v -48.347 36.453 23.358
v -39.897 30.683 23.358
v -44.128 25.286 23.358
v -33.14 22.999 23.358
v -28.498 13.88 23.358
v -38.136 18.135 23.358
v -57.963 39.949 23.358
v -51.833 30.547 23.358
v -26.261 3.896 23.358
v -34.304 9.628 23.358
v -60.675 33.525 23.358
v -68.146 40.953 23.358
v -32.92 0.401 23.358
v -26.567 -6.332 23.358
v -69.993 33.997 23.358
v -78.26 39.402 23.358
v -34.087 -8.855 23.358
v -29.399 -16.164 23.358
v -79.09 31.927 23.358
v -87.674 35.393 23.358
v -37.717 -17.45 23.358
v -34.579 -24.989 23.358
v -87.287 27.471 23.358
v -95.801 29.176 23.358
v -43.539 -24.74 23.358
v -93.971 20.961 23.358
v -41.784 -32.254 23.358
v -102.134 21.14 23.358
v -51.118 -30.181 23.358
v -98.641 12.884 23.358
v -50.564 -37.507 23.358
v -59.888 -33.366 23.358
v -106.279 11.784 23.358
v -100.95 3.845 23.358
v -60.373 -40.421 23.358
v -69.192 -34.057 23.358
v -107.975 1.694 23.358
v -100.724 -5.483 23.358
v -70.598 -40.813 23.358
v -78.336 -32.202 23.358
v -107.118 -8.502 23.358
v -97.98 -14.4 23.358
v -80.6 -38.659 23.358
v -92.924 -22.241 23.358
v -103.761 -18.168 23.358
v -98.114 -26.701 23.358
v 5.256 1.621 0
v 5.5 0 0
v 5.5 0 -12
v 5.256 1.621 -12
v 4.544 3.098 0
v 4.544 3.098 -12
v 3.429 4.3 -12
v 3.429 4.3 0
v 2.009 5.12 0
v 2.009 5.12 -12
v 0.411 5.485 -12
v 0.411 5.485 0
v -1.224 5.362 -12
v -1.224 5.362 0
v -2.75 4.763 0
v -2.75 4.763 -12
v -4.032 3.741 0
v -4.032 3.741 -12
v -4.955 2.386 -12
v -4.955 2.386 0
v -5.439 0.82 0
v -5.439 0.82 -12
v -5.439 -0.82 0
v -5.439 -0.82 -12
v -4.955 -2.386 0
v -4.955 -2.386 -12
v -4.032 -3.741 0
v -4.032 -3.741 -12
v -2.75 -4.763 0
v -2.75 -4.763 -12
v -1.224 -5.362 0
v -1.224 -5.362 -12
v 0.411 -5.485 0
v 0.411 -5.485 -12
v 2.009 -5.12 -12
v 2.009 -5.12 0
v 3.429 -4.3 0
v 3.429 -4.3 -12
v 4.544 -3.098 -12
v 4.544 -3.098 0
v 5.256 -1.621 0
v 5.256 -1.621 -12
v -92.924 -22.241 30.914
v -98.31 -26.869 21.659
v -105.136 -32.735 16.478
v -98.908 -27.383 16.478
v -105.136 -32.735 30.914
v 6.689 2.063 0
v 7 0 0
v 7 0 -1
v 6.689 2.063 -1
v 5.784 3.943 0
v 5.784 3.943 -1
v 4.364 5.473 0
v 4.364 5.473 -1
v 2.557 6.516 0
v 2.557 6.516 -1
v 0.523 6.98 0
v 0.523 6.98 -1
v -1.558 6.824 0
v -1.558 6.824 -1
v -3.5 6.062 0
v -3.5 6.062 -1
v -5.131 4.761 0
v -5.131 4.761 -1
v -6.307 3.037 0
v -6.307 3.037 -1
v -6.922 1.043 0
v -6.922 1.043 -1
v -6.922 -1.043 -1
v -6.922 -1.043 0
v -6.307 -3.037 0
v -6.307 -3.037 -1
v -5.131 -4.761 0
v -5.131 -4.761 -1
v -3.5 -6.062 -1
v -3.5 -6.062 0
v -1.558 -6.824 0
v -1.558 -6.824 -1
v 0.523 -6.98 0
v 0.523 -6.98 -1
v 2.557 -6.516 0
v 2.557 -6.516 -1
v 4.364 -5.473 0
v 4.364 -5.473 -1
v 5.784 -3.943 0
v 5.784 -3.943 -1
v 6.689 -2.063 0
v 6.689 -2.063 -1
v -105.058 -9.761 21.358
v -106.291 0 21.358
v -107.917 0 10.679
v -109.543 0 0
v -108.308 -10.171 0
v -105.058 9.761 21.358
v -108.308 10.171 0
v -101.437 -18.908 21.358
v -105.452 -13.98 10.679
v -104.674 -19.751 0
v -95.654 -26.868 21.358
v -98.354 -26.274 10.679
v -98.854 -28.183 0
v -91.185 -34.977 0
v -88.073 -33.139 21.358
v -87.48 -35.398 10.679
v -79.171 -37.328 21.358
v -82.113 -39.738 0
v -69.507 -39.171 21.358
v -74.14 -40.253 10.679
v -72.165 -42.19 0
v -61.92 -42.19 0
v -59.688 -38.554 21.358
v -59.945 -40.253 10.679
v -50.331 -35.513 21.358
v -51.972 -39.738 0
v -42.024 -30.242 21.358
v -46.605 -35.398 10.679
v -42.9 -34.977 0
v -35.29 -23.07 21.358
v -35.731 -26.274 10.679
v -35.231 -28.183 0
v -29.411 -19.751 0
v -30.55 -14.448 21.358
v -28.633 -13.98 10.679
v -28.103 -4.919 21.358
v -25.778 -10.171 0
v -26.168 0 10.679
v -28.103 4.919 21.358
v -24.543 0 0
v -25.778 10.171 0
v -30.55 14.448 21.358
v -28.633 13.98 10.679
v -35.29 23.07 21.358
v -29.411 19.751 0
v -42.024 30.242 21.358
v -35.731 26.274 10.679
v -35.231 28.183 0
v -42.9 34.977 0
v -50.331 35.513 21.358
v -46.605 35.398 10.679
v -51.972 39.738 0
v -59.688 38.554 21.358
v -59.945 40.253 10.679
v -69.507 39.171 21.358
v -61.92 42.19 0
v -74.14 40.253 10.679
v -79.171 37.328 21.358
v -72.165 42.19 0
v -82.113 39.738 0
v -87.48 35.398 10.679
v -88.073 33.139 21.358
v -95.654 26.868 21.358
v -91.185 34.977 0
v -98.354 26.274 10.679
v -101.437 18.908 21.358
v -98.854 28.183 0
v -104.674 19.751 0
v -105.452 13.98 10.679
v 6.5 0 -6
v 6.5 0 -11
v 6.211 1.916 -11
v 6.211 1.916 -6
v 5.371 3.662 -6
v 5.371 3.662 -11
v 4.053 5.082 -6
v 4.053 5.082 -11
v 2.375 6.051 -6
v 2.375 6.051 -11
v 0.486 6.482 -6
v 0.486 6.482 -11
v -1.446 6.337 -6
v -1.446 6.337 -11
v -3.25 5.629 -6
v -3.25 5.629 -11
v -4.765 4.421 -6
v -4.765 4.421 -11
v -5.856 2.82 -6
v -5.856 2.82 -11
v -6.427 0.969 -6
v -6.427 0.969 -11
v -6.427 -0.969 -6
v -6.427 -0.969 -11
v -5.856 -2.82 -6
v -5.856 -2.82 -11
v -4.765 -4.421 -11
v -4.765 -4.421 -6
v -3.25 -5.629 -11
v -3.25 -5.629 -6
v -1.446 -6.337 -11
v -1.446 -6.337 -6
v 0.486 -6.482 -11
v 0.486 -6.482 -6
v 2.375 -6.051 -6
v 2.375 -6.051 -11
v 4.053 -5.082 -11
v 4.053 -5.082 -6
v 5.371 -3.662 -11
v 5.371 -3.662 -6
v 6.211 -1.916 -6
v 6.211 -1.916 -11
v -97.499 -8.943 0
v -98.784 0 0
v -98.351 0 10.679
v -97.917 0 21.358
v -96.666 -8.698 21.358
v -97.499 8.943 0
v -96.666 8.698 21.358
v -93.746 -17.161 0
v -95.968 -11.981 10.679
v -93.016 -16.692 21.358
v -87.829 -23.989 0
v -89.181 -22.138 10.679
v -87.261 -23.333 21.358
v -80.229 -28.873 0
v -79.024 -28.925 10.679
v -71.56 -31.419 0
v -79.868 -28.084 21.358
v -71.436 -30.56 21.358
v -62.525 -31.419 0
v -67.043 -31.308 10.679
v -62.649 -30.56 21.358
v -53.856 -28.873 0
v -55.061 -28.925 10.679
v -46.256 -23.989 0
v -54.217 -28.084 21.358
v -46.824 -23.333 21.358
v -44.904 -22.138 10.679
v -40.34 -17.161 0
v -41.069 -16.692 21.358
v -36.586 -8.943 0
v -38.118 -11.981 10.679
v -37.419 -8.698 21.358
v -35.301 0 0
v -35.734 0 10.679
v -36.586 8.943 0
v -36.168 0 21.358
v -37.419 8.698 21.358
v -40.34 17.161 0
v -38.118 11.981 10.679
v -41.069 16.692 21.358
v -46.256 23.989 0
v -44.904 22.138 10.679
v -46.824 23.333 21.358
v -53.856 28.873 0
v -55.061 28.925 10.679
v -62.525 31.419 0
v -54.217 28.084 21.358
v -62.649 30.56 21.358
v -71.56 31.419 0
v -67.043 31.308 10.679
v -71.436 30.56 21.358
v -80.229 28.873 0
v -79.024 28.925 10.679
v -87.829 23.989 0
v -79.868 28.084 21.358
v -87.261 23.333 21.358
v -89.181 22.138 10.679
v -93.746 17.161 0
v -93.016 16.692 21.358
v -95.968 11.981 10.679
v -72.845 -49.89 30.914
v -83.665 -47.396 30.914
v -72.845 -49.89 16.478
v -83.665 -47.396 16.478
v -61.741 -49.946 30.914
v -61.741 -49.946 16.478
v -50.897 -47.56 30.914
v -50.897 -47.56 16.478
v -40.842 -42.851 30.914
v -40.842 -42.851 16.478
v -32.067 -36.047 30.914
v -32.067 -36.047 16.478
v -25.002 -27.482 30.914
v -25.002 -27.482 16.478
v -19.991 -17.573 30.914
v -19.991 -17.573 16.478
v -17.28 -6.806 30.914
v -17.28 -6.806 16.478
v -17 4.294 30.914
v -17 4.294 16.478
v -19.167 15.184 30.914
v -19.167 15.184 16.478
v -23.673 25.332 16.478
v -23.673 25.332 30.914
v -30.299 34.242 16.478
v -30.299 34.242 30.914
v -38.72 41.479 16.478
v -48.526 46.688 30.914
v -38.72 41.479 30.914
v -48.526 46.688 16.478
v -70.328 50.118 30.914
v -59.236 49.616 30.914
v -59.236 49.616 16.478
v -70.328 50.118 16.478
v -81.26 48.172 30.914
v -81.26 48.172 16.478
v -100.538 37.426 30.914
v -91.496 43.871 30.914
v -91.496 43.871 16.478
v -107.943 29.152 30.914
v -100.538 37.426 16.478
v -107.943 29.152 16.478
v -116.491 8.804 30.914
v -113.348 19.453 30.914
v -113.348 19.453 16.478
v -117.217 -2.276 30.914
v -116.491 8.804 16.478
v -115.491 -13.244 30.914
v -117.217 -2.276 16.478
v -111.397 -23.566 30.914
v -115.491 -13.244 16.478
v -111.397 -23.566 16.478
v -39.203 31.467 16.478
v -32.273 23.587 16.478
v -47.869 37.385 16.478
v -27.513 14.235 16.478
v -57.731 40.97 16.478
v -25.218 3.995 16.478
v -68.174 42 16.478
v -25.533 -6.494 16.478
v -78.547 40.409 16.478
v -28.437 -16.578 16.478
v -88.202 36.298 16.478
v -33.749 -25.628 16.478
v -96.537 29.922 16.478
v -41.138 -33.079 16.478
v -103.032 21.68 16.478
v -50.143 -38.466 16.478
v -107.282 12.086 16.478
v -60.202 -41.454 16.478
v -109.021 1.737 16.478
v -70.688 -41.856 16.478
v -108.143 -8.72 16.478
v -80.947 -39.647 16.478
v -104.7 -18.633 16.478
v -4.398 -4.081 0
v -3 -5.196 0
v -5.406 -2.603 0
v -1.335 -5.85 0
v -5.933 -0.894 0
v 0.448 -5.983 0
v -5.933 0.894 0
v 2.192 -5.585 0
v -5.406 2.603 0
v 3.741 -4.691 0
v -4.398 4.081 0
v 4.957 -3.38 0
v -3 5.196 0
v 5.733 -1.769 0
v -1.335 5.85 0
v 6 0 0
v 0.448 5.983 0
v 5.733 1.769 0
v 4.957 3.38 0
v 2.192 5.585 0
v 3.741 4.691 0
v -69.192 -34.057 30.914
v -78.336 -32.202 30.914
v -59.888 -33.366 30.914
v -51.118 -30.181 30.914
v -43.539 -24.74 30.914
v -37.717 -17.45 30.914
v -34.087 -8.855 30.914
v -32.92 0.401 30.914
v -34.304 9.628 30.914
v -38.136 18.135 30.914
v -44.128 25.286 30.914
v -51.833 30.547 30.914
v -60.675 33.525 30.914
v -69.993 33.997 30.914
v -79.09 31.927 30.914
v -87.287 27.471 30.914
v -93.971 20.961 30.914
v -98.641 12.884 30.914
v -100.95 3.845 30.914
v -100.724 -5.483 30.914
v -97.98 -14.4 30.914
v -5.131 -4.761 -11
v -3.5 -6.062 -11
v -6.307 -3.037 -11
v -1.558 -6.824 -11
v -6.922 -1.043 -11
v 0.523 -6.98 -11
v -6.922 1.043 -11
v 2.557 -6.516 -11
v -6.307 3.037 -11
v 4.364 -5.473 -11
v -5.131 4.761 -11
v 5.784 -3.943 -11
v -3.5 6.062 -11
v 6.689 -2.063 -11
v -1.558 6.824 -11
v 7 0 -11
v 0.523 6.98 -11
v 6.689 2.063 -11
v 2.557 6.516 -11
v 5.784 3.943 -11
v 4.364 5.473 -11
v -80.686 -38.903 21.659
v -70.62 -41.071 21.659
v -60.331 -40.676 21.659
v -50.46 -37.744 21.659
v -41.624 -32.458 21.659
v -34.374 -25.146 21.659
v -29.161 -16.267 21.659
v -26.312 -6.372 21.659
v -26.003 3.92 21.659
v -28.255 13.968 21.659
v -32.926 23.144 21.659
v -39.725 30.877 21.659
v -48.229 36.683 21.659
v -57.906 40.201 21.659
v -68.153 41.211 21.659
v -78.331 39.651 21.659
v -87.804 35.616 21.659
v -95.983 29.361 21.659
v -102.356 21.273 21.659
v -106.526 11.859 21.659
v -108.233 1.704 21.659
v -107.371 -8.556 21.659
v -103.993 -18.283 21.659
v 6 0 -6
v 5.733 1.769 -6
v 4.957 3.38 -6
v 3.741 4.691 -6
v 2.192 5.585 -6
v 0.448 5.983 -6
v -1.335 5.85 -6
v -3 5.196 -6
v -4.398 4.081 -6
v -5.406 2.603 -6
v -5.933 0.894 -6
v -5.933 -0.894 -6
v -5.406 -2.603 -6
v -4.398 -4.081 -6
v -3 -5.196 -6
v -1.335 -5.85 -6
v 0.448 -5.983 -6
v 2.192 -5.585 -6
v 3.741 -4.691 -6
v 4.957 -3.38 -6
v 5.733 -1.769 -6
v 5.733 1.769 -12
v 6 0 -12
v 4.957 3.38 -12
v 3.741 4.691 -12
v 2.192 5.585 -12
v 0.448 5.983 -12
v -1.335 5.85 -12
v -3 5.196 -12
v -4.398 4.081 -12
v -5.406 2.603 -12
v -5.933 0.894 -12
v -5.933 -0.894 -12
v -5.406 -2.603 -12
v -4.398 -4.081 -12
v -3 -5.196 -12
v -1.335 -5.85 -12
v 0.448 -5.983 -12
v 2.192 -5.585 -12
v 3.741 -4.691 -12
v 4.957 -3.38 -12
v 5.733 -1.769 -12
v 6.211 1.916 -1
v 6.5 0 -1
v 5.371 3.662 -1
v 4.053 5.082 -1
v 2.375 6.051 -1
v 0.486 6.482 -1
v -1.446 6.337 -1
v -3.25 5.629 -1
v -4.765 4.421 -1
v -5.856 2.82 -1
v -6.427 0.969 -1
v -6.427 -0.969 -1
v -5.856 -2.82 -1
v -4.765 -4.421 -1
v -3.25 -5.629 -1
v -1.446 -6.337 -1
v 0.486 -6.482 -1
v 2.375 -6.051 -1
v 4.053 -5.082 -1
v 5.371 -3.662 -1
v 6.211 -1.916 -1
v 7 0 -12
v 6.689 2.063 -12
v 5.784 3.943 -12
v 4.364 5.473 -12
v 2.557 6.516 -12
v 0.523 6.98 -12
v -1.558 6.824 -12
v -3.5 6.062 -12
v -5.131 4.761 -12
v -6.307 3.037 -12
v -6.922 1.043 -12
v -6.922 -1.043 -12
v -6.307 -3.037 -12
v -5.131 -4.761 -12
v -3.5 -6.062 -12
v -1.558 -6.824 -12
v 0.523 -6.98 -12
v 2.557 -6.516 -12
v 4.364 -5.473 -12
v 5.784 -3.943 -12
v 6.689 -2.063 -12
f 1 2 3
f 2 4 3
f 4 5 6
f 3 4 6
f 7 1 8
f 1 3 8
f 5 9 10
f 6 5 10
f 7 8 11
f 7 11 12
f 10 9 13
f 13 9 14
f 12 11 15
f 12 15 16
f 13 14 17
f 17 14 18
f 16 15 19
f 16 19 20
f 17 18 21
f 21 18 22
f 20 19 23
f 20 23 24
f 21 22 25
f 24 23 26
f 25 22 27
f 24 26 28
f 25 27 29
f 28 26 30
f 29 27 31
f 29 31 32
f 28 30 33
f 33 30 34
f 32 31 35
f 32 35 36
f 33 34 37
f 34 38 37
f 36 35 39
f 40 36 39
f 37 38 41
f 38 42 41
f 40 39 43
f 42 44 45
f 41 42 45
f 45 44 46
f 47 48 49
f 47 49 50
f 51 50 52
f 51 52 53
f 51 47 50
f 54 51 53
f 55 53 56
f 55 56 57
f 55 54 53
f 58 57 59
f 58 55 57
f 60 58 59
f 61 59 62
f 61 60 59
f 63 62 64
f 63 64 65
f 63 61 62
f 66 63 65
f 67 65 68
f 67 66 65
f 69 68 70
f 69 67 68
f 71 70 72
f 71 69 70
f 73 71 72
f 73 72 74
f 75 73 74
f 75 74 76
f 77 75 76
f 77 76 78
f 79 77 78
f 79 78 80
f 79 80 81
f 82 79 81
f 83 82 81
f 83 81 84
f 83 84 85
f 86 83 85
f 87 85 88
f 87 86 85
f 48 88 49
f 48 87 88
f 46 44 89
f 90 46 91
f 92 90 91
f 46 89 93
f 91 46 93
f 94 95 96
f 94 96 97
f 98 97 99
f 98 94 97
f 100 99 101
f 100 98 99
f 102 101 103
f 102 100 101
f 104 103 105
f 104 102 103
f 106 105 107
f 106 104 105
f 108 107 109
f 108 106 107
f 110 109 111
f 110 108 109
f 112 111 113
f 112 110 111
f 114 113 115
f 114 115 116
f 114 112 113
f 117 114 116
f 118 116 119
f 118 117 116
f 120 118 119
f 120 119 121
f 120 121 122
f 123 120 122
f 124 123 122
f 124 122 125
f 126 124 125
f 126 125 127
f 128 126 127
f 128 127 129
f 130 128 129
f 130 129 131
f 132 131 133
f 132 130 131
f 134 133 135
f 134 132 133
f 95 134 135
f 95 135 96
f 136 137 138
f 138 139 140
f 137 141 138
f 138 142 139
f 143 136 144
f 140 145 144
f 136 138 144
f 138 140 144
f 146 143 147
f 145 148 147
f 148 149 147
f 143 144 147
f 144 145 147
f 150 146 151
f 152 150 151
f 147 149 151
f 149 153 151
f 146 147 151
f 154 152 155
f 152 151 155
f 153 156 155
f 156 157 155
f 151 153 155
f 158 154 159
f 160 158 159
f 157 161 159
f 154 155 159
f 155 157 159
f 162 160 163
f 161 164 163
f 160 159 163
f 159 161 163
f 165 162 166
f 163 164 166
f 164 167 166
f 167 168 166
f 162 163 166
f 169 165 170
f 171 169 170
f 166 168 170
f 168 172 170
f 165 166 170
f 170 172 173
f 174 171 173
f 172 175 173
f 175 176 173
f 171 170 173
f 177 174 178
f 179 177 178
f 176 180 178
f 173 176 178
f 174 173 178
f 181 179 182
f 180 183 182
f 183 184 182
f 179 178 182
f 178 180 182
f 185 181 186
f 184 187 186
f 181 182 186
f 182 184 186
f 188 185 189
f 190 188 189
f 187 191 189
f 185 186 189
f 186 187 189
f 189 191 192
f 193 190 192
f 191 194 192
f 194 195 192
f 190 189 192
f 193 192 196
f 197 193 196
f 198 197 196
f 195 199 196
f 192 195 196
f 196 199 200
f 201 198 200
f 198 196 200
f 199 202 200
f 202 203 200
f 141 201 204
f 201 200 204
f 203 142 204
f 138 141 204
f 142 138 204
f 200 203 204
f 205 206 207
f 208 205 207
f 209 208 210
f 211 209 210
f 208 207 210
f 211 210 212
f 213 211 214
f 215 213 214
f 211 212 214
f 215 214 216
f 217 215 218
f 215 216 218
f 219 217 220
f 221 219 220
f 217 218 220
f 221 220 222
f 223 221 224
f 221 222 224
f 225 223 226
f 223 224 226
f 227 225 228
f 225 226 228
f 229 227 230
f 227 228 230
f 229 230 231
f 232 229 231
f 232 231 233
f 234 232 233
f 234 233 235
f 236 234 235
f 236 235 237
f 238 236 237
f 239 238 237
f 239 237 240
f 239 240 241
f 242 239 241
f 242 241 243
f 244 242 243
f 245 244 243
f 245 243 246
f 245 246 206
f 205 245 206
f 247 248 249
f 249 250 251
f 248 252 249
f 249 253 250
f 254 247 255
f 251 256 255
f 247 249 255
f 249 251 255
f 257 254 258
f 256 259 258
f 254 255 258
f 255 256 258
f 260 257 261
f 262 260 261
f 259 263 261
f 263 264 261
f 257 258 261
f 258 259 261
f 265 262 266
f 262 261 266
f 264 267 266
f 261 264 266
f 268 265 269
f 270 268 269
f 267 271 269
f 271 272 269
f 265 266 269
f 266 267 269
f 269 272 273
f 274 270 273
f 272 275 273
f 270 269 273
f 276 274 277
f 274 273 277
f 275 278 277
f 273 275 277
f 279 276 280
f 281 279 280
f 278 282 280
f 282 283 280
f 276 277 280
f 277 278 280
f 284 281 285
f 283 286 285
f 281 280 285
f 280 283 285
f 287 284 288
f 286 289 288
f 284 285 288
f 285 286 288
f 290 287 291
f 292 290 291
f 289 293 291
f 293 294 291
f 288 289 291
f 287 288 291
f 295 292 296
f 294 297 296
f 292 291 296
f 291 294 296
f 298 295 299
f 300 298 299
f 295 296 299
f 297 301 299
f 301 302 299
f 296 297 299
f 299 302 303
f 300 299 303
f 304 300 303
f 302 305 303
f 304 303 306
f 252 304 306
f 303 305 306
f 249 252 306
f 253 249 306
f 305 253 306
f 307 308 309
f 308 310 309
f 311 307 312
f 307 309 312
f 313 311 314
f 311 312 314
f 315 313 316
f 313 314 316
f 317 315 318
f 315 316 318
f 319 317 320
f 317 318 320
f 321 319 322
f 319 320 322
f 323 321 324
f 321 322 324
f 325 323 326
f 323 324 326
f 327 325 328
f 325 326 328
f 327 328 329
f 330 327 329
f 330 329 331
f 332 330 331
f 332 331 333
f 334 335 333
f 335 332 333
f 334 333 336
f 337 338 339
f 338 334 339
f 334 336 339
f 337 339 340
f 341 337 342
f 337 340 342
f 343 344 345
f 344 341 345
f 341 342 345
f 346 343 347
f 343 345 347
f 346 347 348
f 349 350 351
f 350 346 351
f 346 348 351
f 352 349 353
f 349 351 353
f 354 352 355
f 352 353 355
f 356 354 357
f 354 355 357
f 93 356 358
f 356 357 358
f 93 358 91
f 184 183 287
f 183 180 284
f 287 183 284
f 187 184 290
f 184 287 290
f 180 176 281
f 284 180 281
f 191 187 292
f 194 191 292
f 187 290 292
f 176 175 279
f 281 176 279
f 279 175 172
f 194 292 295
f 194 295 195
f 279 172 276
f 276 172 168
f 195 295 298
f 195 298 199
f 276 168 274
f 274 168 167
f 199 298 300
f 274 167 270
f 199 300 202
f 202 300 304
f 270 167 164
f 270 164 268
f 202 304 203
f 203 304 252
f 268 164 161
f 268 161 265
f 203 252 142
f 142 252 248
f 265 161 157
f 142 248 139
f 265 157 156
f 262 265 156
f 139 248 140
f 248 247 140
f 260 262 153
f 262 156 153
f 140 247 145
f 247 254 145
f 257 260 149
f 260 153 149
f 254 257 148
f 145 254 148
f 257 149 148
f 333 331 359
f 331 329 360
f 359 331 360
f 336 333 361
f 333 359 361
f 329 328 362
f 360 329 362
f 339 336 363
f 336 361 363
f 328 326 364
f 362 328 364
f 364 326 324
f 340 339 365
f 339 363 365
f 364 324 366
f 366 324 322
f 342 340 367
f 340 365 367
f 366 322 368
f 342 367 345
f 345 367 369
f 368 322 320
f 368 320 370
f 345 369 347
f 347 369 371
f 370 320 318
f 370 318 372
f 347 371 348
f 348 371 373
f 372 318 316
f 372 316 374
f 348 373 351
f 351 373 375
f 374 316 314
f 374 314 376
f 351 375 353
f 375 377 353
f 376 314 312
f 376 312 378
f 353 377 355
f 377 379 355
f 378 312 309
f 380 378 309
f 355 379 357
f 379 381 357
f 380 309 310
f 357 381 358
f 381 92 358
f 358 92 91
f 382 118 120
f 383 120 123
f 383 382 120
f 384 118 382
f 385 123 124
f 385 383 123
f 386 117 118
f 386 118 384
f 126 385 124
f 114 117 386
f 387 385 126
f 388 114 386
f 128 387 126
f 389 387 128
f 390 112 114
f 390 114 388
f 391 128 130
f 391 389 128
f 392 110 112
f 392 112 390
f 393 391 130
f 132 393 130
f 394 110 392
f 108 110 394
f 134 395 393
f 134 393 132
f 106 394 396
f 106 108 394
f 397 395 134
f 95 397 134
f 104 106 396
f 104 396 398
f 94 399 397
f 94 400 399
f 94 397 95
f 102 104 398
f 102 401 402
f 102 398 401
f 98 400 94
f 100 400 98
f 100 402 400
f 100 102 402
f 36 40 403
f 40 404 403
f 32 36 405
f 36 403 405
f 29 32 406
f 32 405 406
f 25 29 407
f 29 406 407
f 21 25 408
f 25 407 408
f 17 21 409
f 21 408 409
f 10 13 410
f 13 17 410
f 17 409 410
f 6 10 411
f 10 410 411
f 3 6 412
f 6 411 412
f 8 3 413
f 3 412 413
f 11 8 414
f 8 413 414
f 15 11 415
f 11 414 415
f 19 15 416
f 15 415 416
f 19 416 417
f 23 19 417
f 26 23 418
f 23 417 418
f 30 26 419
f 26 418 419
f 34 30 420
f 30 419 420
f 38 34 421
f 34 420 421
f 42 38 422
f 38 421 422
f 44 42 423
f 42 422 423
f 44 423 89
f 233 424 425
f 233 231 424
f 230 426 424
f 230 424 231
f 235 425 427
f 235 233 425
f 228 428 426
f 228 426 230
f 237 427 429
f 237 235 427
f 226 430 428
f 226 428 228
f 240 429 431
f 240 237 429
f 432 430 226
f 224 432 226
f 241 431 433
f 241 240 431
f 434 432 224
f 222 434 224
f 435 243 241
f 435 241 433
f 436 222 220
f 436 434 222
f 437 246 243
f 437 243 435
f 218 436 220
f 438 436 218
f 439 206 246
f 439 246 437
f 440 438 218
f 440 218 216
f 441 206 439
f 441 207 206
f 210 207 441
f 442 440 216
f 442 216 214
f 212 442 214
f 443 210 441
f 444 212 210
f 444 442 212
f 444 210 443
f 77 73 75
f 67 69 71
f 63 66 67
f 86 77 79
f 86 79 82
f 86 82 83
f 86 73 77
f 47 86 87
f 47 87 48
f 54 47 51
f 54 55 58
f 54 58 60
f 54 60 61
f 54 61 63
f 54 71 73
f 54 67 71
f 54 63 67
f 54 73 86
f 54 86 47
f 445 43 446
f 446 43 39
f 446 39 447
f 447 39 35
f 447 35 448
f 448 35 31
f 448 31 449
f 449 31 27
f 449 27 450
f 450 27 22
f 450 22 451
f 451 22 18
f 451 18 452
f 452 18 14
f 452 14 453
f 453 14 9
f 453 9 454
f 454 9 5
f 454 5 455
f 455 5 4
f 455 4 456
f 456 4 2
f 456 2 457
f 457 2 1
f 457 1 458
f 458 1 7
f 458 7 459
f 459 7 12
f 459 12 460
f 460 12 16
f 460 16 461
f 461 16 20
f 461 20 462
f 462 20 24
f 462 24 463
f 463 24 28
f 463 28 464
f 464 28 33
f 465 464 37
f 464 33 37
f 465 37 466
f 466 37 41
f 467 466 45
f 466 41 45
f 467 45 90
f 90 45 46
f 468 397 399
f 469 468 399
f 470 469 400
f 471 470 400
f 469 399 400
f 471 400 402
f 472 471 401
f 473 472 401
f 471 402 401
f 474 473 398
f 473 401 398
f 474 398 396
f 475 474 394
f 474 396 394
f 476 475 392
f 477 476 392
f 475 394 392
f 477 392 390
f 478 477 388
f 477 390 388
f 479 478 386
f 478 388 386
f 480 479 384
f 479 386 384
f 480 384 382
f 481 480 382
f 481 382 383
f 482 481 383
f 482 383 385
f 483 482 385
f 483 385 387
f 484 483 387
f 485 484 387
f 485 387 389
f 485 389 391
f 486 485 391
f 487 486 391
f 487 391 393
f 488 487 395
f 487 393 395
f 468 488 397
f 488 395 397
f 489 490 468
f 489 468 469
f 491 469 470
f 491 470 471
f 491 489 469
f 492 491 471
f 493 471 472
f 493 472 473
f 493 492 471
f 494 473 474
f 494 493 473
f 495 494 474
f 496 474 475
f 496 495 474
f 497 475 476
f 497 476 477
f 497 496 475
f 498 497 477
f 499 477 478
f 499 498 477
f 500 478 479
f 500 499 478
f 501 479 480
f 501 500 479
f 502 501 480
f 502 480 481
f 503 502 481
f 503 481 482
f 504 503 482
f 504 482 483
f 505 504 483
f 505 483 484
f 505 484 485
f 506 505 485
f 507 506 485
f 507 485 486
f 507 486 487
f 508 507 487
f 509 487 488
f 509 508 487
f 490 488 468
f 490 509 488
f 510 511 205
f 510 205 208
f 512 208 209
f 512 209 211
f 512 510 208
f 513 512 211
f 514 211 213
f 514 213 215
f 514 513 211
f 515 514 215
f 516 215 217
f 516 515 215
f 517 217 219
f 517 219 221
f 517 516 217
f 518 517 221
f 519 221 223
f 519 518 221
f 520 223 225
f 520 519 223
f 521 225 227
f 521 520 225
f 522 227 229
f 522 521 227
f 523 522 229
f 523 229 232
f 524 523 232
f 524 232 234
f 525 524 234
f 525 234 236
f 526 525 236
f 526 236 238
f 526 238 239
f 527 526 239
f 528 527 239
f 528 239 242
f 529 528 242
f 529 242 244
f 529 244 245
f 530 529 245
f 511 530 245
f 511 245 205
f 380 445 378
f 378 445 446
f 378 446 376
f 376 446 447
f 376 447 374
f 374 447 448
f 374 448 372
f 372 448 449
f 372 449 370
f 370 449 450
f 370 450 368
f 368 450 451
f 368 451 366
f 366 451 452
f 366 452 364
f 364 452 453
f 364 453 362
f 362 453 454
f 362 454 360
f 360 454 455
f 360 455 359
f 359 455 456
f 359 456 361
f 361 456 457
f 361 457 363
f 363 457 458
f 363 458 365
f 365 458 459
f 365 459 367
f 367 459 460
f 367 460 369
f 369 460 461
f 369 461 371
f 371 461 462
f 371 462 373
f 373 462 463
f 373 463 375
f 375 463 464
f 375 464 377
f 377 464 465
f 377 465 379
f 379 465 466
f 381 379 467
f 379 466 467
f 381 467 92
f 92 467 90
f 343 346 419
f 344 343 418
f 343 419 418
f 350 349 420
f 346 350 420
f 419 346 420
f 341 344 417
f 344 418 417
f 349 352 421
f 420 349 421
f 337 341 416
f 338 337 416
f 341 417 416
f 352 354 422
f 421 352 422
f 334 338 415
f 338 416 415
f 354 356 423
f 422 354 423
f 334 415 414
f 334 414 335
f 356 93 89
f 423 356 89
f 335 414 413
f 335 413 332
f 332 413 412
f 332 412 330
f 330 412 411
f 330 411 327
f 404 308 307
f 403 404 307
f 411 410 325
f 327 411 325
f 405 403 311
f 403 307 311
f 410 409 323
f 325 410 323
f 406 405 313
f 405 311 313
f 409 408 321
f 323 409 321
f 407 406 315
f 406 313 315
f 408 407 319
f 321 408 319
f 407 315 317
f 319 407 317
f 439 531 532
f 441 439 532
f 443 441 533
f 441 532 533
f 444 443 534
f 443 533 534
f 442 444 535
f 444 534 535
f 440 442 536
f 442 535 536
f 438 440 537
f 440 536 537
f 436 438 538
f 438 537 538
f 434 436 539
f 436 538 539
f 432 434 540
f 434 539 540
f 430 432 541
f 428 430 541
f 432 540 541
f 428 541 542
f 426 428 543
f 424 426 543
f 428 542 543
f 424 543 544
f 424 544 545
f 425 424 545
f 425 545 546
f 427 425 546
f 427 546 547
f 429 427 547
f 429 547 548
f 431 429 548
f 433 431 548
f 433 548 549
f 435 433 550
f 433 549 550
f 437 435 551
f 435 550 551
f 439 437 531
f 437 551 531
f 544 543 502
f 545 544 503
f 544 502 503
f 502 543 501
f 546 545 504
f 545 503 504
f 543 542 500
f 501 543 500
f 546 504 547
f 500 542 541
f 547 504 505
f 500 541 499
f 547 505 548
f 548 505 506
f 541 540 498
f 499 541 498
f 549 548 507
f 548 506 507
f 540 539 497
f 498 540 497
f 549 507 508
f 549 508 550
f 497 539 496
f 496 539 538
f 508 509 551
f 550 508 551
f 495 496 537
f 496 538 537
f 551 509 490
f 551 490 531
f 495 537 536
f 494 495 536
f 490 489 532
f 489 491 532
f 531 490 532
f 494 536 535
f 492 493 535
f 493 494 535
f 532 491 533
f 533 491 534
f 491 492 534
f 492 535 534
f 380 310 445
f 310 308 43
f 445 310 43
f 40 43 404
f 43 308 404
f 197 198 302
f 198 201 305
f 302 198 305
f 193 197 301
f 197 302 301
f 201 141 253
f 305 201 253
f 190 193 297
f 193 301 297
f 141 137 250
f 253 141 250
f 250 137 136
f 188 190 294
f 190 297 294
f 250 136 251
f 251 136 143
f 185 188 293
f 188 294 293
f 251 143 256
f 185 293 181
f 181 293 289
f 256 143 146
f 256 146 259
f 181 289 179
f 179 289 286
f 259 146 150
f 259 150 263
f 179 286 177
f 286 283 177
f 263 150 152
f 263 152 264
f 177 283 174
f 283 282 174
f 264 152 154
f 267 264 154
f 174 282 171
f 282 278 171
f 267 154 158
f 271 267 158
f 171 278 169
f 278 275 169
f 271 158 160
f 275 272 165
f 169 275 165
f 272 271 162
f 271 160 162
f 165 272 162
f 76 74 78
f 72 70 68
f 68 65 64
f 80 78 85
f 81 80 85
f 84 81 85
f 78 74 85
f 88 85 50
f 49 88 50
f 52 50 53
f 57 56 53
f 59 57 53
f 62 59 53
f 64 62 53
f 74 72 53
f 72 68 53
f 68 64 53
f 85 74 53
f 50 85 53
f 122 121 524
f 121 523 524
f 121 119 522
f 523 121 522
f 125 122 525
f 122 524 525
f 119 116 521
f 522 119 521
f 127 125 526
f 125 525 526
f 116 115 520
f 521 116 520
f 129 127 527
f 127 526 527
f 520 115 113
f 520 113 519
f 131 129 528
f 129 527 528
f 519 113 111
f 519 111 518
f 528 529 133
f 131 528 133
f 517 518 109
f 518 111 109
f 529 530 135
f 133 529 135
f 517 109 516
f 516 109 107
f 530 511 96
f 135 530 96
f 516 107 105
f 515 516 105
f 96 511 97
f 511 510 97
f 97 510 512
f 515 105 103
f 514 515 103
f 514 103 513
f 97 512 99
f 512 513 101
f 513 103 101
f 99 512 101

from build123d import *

# Parameters (mm, degrees)
F0_R     = 6.5
F0_R_2   = 6
F1_DEPTH = 6
F0_R_3   = 7
F2_DEPTH = 1
F0_R_4   = 5.5
F4_DEPTH = 12
F9_DEPTH = 25


with BuildPart() as f1:
    # F0 (on Top) → F1 (new body)
    with BuildSketch(Plane.XY):
        Circle(F0_R)
        Circle(F0_R_2, mode=Mode.SUBTRACT)
    extrude(amount=-F1_DEPTH)

    # F0 (on Top) → F2 (join)
    with BuildSketch(Plane.XY):
        Circle(F0_R_3)
        Circle(F0_R, mode=Mode.SUBTRACT)
    extrude(amount=-F2_DEPTH)

    # F3: F1 across face


with BuildPart() as f1_1:
    add(f1.part)
    add(f1.part.mirror(Plane(origin=(0, 0, -6), x_dir=(1, 0, 0), z_dir=(0, 0, -1))))


with BuildPart() as f4:
    # F0 (on Top) → F4 (new body)
    with BuildSketch(Plane.XY):
        Circle(F0_R_4)
    extrude(amount=-F4_DEPTH)


with BuildPart() as f6:
    # F5 (on Front) → F6 (revolve)
    with BuildSketch(Plane.XZ):
        Polygon((-109.5425453782, 0), (-98.7844988704, 0), (-97.9169787446, 21.3577989489), (-106.291412111, 21.3577989489), align=None)
    revolve(axis=Axis((-67.0425453782, 0, 15), (0, 0, 1)))


with BuildPart() as f7:
    # F5 (on Front) → F7 (revolve)
    with BuildSketch(Plane.XZ):
        Polygon((-117.2685921192, 16.4775380677), (-109.0573355747, 16.4775380677), (-108.2686355544, 21.658776448), (-108.0100064425, 23.3577989489), (-106.291412111, 23.3577989489), (-101.1670082808, 23.3577989489), (-101.1670082808, 30.9135392308), (-117.2685921192, 30.9135392308), align=None)
    revolve(axis=Axis((-67.0425453782, 0, 15), (0, 0, 1)))

    # F8 (on face) → F9 (cut)
    with BuildSketch(Plane.XY.offset(30.9135392308)):
        with BuildLine():
            ThreePointArc((-78.3358060439, -32.2015718859), (-86.2853776046, -28.1814189901), (-92.9235819492, -22.2407489621))
            Line((-92.9235819492, -22.2407489621), (-105.1355156979, -32.7350176944))
            ThreePointArc((-105.1355156979, -32.7350176944), (-95.365083189, -41.4787852183), (-83.6645165335, -47.3958420765))
            Line((-83.6645165335, -47.3958420765), (-78.3358060439, -32.2015718859))
        make_face()
    extrude(amount=-F9_DEPTH, mode=Mode.SUBTRACT)


solid = Compound([f1_1.part, f4.part, f6.part, f7.part])
